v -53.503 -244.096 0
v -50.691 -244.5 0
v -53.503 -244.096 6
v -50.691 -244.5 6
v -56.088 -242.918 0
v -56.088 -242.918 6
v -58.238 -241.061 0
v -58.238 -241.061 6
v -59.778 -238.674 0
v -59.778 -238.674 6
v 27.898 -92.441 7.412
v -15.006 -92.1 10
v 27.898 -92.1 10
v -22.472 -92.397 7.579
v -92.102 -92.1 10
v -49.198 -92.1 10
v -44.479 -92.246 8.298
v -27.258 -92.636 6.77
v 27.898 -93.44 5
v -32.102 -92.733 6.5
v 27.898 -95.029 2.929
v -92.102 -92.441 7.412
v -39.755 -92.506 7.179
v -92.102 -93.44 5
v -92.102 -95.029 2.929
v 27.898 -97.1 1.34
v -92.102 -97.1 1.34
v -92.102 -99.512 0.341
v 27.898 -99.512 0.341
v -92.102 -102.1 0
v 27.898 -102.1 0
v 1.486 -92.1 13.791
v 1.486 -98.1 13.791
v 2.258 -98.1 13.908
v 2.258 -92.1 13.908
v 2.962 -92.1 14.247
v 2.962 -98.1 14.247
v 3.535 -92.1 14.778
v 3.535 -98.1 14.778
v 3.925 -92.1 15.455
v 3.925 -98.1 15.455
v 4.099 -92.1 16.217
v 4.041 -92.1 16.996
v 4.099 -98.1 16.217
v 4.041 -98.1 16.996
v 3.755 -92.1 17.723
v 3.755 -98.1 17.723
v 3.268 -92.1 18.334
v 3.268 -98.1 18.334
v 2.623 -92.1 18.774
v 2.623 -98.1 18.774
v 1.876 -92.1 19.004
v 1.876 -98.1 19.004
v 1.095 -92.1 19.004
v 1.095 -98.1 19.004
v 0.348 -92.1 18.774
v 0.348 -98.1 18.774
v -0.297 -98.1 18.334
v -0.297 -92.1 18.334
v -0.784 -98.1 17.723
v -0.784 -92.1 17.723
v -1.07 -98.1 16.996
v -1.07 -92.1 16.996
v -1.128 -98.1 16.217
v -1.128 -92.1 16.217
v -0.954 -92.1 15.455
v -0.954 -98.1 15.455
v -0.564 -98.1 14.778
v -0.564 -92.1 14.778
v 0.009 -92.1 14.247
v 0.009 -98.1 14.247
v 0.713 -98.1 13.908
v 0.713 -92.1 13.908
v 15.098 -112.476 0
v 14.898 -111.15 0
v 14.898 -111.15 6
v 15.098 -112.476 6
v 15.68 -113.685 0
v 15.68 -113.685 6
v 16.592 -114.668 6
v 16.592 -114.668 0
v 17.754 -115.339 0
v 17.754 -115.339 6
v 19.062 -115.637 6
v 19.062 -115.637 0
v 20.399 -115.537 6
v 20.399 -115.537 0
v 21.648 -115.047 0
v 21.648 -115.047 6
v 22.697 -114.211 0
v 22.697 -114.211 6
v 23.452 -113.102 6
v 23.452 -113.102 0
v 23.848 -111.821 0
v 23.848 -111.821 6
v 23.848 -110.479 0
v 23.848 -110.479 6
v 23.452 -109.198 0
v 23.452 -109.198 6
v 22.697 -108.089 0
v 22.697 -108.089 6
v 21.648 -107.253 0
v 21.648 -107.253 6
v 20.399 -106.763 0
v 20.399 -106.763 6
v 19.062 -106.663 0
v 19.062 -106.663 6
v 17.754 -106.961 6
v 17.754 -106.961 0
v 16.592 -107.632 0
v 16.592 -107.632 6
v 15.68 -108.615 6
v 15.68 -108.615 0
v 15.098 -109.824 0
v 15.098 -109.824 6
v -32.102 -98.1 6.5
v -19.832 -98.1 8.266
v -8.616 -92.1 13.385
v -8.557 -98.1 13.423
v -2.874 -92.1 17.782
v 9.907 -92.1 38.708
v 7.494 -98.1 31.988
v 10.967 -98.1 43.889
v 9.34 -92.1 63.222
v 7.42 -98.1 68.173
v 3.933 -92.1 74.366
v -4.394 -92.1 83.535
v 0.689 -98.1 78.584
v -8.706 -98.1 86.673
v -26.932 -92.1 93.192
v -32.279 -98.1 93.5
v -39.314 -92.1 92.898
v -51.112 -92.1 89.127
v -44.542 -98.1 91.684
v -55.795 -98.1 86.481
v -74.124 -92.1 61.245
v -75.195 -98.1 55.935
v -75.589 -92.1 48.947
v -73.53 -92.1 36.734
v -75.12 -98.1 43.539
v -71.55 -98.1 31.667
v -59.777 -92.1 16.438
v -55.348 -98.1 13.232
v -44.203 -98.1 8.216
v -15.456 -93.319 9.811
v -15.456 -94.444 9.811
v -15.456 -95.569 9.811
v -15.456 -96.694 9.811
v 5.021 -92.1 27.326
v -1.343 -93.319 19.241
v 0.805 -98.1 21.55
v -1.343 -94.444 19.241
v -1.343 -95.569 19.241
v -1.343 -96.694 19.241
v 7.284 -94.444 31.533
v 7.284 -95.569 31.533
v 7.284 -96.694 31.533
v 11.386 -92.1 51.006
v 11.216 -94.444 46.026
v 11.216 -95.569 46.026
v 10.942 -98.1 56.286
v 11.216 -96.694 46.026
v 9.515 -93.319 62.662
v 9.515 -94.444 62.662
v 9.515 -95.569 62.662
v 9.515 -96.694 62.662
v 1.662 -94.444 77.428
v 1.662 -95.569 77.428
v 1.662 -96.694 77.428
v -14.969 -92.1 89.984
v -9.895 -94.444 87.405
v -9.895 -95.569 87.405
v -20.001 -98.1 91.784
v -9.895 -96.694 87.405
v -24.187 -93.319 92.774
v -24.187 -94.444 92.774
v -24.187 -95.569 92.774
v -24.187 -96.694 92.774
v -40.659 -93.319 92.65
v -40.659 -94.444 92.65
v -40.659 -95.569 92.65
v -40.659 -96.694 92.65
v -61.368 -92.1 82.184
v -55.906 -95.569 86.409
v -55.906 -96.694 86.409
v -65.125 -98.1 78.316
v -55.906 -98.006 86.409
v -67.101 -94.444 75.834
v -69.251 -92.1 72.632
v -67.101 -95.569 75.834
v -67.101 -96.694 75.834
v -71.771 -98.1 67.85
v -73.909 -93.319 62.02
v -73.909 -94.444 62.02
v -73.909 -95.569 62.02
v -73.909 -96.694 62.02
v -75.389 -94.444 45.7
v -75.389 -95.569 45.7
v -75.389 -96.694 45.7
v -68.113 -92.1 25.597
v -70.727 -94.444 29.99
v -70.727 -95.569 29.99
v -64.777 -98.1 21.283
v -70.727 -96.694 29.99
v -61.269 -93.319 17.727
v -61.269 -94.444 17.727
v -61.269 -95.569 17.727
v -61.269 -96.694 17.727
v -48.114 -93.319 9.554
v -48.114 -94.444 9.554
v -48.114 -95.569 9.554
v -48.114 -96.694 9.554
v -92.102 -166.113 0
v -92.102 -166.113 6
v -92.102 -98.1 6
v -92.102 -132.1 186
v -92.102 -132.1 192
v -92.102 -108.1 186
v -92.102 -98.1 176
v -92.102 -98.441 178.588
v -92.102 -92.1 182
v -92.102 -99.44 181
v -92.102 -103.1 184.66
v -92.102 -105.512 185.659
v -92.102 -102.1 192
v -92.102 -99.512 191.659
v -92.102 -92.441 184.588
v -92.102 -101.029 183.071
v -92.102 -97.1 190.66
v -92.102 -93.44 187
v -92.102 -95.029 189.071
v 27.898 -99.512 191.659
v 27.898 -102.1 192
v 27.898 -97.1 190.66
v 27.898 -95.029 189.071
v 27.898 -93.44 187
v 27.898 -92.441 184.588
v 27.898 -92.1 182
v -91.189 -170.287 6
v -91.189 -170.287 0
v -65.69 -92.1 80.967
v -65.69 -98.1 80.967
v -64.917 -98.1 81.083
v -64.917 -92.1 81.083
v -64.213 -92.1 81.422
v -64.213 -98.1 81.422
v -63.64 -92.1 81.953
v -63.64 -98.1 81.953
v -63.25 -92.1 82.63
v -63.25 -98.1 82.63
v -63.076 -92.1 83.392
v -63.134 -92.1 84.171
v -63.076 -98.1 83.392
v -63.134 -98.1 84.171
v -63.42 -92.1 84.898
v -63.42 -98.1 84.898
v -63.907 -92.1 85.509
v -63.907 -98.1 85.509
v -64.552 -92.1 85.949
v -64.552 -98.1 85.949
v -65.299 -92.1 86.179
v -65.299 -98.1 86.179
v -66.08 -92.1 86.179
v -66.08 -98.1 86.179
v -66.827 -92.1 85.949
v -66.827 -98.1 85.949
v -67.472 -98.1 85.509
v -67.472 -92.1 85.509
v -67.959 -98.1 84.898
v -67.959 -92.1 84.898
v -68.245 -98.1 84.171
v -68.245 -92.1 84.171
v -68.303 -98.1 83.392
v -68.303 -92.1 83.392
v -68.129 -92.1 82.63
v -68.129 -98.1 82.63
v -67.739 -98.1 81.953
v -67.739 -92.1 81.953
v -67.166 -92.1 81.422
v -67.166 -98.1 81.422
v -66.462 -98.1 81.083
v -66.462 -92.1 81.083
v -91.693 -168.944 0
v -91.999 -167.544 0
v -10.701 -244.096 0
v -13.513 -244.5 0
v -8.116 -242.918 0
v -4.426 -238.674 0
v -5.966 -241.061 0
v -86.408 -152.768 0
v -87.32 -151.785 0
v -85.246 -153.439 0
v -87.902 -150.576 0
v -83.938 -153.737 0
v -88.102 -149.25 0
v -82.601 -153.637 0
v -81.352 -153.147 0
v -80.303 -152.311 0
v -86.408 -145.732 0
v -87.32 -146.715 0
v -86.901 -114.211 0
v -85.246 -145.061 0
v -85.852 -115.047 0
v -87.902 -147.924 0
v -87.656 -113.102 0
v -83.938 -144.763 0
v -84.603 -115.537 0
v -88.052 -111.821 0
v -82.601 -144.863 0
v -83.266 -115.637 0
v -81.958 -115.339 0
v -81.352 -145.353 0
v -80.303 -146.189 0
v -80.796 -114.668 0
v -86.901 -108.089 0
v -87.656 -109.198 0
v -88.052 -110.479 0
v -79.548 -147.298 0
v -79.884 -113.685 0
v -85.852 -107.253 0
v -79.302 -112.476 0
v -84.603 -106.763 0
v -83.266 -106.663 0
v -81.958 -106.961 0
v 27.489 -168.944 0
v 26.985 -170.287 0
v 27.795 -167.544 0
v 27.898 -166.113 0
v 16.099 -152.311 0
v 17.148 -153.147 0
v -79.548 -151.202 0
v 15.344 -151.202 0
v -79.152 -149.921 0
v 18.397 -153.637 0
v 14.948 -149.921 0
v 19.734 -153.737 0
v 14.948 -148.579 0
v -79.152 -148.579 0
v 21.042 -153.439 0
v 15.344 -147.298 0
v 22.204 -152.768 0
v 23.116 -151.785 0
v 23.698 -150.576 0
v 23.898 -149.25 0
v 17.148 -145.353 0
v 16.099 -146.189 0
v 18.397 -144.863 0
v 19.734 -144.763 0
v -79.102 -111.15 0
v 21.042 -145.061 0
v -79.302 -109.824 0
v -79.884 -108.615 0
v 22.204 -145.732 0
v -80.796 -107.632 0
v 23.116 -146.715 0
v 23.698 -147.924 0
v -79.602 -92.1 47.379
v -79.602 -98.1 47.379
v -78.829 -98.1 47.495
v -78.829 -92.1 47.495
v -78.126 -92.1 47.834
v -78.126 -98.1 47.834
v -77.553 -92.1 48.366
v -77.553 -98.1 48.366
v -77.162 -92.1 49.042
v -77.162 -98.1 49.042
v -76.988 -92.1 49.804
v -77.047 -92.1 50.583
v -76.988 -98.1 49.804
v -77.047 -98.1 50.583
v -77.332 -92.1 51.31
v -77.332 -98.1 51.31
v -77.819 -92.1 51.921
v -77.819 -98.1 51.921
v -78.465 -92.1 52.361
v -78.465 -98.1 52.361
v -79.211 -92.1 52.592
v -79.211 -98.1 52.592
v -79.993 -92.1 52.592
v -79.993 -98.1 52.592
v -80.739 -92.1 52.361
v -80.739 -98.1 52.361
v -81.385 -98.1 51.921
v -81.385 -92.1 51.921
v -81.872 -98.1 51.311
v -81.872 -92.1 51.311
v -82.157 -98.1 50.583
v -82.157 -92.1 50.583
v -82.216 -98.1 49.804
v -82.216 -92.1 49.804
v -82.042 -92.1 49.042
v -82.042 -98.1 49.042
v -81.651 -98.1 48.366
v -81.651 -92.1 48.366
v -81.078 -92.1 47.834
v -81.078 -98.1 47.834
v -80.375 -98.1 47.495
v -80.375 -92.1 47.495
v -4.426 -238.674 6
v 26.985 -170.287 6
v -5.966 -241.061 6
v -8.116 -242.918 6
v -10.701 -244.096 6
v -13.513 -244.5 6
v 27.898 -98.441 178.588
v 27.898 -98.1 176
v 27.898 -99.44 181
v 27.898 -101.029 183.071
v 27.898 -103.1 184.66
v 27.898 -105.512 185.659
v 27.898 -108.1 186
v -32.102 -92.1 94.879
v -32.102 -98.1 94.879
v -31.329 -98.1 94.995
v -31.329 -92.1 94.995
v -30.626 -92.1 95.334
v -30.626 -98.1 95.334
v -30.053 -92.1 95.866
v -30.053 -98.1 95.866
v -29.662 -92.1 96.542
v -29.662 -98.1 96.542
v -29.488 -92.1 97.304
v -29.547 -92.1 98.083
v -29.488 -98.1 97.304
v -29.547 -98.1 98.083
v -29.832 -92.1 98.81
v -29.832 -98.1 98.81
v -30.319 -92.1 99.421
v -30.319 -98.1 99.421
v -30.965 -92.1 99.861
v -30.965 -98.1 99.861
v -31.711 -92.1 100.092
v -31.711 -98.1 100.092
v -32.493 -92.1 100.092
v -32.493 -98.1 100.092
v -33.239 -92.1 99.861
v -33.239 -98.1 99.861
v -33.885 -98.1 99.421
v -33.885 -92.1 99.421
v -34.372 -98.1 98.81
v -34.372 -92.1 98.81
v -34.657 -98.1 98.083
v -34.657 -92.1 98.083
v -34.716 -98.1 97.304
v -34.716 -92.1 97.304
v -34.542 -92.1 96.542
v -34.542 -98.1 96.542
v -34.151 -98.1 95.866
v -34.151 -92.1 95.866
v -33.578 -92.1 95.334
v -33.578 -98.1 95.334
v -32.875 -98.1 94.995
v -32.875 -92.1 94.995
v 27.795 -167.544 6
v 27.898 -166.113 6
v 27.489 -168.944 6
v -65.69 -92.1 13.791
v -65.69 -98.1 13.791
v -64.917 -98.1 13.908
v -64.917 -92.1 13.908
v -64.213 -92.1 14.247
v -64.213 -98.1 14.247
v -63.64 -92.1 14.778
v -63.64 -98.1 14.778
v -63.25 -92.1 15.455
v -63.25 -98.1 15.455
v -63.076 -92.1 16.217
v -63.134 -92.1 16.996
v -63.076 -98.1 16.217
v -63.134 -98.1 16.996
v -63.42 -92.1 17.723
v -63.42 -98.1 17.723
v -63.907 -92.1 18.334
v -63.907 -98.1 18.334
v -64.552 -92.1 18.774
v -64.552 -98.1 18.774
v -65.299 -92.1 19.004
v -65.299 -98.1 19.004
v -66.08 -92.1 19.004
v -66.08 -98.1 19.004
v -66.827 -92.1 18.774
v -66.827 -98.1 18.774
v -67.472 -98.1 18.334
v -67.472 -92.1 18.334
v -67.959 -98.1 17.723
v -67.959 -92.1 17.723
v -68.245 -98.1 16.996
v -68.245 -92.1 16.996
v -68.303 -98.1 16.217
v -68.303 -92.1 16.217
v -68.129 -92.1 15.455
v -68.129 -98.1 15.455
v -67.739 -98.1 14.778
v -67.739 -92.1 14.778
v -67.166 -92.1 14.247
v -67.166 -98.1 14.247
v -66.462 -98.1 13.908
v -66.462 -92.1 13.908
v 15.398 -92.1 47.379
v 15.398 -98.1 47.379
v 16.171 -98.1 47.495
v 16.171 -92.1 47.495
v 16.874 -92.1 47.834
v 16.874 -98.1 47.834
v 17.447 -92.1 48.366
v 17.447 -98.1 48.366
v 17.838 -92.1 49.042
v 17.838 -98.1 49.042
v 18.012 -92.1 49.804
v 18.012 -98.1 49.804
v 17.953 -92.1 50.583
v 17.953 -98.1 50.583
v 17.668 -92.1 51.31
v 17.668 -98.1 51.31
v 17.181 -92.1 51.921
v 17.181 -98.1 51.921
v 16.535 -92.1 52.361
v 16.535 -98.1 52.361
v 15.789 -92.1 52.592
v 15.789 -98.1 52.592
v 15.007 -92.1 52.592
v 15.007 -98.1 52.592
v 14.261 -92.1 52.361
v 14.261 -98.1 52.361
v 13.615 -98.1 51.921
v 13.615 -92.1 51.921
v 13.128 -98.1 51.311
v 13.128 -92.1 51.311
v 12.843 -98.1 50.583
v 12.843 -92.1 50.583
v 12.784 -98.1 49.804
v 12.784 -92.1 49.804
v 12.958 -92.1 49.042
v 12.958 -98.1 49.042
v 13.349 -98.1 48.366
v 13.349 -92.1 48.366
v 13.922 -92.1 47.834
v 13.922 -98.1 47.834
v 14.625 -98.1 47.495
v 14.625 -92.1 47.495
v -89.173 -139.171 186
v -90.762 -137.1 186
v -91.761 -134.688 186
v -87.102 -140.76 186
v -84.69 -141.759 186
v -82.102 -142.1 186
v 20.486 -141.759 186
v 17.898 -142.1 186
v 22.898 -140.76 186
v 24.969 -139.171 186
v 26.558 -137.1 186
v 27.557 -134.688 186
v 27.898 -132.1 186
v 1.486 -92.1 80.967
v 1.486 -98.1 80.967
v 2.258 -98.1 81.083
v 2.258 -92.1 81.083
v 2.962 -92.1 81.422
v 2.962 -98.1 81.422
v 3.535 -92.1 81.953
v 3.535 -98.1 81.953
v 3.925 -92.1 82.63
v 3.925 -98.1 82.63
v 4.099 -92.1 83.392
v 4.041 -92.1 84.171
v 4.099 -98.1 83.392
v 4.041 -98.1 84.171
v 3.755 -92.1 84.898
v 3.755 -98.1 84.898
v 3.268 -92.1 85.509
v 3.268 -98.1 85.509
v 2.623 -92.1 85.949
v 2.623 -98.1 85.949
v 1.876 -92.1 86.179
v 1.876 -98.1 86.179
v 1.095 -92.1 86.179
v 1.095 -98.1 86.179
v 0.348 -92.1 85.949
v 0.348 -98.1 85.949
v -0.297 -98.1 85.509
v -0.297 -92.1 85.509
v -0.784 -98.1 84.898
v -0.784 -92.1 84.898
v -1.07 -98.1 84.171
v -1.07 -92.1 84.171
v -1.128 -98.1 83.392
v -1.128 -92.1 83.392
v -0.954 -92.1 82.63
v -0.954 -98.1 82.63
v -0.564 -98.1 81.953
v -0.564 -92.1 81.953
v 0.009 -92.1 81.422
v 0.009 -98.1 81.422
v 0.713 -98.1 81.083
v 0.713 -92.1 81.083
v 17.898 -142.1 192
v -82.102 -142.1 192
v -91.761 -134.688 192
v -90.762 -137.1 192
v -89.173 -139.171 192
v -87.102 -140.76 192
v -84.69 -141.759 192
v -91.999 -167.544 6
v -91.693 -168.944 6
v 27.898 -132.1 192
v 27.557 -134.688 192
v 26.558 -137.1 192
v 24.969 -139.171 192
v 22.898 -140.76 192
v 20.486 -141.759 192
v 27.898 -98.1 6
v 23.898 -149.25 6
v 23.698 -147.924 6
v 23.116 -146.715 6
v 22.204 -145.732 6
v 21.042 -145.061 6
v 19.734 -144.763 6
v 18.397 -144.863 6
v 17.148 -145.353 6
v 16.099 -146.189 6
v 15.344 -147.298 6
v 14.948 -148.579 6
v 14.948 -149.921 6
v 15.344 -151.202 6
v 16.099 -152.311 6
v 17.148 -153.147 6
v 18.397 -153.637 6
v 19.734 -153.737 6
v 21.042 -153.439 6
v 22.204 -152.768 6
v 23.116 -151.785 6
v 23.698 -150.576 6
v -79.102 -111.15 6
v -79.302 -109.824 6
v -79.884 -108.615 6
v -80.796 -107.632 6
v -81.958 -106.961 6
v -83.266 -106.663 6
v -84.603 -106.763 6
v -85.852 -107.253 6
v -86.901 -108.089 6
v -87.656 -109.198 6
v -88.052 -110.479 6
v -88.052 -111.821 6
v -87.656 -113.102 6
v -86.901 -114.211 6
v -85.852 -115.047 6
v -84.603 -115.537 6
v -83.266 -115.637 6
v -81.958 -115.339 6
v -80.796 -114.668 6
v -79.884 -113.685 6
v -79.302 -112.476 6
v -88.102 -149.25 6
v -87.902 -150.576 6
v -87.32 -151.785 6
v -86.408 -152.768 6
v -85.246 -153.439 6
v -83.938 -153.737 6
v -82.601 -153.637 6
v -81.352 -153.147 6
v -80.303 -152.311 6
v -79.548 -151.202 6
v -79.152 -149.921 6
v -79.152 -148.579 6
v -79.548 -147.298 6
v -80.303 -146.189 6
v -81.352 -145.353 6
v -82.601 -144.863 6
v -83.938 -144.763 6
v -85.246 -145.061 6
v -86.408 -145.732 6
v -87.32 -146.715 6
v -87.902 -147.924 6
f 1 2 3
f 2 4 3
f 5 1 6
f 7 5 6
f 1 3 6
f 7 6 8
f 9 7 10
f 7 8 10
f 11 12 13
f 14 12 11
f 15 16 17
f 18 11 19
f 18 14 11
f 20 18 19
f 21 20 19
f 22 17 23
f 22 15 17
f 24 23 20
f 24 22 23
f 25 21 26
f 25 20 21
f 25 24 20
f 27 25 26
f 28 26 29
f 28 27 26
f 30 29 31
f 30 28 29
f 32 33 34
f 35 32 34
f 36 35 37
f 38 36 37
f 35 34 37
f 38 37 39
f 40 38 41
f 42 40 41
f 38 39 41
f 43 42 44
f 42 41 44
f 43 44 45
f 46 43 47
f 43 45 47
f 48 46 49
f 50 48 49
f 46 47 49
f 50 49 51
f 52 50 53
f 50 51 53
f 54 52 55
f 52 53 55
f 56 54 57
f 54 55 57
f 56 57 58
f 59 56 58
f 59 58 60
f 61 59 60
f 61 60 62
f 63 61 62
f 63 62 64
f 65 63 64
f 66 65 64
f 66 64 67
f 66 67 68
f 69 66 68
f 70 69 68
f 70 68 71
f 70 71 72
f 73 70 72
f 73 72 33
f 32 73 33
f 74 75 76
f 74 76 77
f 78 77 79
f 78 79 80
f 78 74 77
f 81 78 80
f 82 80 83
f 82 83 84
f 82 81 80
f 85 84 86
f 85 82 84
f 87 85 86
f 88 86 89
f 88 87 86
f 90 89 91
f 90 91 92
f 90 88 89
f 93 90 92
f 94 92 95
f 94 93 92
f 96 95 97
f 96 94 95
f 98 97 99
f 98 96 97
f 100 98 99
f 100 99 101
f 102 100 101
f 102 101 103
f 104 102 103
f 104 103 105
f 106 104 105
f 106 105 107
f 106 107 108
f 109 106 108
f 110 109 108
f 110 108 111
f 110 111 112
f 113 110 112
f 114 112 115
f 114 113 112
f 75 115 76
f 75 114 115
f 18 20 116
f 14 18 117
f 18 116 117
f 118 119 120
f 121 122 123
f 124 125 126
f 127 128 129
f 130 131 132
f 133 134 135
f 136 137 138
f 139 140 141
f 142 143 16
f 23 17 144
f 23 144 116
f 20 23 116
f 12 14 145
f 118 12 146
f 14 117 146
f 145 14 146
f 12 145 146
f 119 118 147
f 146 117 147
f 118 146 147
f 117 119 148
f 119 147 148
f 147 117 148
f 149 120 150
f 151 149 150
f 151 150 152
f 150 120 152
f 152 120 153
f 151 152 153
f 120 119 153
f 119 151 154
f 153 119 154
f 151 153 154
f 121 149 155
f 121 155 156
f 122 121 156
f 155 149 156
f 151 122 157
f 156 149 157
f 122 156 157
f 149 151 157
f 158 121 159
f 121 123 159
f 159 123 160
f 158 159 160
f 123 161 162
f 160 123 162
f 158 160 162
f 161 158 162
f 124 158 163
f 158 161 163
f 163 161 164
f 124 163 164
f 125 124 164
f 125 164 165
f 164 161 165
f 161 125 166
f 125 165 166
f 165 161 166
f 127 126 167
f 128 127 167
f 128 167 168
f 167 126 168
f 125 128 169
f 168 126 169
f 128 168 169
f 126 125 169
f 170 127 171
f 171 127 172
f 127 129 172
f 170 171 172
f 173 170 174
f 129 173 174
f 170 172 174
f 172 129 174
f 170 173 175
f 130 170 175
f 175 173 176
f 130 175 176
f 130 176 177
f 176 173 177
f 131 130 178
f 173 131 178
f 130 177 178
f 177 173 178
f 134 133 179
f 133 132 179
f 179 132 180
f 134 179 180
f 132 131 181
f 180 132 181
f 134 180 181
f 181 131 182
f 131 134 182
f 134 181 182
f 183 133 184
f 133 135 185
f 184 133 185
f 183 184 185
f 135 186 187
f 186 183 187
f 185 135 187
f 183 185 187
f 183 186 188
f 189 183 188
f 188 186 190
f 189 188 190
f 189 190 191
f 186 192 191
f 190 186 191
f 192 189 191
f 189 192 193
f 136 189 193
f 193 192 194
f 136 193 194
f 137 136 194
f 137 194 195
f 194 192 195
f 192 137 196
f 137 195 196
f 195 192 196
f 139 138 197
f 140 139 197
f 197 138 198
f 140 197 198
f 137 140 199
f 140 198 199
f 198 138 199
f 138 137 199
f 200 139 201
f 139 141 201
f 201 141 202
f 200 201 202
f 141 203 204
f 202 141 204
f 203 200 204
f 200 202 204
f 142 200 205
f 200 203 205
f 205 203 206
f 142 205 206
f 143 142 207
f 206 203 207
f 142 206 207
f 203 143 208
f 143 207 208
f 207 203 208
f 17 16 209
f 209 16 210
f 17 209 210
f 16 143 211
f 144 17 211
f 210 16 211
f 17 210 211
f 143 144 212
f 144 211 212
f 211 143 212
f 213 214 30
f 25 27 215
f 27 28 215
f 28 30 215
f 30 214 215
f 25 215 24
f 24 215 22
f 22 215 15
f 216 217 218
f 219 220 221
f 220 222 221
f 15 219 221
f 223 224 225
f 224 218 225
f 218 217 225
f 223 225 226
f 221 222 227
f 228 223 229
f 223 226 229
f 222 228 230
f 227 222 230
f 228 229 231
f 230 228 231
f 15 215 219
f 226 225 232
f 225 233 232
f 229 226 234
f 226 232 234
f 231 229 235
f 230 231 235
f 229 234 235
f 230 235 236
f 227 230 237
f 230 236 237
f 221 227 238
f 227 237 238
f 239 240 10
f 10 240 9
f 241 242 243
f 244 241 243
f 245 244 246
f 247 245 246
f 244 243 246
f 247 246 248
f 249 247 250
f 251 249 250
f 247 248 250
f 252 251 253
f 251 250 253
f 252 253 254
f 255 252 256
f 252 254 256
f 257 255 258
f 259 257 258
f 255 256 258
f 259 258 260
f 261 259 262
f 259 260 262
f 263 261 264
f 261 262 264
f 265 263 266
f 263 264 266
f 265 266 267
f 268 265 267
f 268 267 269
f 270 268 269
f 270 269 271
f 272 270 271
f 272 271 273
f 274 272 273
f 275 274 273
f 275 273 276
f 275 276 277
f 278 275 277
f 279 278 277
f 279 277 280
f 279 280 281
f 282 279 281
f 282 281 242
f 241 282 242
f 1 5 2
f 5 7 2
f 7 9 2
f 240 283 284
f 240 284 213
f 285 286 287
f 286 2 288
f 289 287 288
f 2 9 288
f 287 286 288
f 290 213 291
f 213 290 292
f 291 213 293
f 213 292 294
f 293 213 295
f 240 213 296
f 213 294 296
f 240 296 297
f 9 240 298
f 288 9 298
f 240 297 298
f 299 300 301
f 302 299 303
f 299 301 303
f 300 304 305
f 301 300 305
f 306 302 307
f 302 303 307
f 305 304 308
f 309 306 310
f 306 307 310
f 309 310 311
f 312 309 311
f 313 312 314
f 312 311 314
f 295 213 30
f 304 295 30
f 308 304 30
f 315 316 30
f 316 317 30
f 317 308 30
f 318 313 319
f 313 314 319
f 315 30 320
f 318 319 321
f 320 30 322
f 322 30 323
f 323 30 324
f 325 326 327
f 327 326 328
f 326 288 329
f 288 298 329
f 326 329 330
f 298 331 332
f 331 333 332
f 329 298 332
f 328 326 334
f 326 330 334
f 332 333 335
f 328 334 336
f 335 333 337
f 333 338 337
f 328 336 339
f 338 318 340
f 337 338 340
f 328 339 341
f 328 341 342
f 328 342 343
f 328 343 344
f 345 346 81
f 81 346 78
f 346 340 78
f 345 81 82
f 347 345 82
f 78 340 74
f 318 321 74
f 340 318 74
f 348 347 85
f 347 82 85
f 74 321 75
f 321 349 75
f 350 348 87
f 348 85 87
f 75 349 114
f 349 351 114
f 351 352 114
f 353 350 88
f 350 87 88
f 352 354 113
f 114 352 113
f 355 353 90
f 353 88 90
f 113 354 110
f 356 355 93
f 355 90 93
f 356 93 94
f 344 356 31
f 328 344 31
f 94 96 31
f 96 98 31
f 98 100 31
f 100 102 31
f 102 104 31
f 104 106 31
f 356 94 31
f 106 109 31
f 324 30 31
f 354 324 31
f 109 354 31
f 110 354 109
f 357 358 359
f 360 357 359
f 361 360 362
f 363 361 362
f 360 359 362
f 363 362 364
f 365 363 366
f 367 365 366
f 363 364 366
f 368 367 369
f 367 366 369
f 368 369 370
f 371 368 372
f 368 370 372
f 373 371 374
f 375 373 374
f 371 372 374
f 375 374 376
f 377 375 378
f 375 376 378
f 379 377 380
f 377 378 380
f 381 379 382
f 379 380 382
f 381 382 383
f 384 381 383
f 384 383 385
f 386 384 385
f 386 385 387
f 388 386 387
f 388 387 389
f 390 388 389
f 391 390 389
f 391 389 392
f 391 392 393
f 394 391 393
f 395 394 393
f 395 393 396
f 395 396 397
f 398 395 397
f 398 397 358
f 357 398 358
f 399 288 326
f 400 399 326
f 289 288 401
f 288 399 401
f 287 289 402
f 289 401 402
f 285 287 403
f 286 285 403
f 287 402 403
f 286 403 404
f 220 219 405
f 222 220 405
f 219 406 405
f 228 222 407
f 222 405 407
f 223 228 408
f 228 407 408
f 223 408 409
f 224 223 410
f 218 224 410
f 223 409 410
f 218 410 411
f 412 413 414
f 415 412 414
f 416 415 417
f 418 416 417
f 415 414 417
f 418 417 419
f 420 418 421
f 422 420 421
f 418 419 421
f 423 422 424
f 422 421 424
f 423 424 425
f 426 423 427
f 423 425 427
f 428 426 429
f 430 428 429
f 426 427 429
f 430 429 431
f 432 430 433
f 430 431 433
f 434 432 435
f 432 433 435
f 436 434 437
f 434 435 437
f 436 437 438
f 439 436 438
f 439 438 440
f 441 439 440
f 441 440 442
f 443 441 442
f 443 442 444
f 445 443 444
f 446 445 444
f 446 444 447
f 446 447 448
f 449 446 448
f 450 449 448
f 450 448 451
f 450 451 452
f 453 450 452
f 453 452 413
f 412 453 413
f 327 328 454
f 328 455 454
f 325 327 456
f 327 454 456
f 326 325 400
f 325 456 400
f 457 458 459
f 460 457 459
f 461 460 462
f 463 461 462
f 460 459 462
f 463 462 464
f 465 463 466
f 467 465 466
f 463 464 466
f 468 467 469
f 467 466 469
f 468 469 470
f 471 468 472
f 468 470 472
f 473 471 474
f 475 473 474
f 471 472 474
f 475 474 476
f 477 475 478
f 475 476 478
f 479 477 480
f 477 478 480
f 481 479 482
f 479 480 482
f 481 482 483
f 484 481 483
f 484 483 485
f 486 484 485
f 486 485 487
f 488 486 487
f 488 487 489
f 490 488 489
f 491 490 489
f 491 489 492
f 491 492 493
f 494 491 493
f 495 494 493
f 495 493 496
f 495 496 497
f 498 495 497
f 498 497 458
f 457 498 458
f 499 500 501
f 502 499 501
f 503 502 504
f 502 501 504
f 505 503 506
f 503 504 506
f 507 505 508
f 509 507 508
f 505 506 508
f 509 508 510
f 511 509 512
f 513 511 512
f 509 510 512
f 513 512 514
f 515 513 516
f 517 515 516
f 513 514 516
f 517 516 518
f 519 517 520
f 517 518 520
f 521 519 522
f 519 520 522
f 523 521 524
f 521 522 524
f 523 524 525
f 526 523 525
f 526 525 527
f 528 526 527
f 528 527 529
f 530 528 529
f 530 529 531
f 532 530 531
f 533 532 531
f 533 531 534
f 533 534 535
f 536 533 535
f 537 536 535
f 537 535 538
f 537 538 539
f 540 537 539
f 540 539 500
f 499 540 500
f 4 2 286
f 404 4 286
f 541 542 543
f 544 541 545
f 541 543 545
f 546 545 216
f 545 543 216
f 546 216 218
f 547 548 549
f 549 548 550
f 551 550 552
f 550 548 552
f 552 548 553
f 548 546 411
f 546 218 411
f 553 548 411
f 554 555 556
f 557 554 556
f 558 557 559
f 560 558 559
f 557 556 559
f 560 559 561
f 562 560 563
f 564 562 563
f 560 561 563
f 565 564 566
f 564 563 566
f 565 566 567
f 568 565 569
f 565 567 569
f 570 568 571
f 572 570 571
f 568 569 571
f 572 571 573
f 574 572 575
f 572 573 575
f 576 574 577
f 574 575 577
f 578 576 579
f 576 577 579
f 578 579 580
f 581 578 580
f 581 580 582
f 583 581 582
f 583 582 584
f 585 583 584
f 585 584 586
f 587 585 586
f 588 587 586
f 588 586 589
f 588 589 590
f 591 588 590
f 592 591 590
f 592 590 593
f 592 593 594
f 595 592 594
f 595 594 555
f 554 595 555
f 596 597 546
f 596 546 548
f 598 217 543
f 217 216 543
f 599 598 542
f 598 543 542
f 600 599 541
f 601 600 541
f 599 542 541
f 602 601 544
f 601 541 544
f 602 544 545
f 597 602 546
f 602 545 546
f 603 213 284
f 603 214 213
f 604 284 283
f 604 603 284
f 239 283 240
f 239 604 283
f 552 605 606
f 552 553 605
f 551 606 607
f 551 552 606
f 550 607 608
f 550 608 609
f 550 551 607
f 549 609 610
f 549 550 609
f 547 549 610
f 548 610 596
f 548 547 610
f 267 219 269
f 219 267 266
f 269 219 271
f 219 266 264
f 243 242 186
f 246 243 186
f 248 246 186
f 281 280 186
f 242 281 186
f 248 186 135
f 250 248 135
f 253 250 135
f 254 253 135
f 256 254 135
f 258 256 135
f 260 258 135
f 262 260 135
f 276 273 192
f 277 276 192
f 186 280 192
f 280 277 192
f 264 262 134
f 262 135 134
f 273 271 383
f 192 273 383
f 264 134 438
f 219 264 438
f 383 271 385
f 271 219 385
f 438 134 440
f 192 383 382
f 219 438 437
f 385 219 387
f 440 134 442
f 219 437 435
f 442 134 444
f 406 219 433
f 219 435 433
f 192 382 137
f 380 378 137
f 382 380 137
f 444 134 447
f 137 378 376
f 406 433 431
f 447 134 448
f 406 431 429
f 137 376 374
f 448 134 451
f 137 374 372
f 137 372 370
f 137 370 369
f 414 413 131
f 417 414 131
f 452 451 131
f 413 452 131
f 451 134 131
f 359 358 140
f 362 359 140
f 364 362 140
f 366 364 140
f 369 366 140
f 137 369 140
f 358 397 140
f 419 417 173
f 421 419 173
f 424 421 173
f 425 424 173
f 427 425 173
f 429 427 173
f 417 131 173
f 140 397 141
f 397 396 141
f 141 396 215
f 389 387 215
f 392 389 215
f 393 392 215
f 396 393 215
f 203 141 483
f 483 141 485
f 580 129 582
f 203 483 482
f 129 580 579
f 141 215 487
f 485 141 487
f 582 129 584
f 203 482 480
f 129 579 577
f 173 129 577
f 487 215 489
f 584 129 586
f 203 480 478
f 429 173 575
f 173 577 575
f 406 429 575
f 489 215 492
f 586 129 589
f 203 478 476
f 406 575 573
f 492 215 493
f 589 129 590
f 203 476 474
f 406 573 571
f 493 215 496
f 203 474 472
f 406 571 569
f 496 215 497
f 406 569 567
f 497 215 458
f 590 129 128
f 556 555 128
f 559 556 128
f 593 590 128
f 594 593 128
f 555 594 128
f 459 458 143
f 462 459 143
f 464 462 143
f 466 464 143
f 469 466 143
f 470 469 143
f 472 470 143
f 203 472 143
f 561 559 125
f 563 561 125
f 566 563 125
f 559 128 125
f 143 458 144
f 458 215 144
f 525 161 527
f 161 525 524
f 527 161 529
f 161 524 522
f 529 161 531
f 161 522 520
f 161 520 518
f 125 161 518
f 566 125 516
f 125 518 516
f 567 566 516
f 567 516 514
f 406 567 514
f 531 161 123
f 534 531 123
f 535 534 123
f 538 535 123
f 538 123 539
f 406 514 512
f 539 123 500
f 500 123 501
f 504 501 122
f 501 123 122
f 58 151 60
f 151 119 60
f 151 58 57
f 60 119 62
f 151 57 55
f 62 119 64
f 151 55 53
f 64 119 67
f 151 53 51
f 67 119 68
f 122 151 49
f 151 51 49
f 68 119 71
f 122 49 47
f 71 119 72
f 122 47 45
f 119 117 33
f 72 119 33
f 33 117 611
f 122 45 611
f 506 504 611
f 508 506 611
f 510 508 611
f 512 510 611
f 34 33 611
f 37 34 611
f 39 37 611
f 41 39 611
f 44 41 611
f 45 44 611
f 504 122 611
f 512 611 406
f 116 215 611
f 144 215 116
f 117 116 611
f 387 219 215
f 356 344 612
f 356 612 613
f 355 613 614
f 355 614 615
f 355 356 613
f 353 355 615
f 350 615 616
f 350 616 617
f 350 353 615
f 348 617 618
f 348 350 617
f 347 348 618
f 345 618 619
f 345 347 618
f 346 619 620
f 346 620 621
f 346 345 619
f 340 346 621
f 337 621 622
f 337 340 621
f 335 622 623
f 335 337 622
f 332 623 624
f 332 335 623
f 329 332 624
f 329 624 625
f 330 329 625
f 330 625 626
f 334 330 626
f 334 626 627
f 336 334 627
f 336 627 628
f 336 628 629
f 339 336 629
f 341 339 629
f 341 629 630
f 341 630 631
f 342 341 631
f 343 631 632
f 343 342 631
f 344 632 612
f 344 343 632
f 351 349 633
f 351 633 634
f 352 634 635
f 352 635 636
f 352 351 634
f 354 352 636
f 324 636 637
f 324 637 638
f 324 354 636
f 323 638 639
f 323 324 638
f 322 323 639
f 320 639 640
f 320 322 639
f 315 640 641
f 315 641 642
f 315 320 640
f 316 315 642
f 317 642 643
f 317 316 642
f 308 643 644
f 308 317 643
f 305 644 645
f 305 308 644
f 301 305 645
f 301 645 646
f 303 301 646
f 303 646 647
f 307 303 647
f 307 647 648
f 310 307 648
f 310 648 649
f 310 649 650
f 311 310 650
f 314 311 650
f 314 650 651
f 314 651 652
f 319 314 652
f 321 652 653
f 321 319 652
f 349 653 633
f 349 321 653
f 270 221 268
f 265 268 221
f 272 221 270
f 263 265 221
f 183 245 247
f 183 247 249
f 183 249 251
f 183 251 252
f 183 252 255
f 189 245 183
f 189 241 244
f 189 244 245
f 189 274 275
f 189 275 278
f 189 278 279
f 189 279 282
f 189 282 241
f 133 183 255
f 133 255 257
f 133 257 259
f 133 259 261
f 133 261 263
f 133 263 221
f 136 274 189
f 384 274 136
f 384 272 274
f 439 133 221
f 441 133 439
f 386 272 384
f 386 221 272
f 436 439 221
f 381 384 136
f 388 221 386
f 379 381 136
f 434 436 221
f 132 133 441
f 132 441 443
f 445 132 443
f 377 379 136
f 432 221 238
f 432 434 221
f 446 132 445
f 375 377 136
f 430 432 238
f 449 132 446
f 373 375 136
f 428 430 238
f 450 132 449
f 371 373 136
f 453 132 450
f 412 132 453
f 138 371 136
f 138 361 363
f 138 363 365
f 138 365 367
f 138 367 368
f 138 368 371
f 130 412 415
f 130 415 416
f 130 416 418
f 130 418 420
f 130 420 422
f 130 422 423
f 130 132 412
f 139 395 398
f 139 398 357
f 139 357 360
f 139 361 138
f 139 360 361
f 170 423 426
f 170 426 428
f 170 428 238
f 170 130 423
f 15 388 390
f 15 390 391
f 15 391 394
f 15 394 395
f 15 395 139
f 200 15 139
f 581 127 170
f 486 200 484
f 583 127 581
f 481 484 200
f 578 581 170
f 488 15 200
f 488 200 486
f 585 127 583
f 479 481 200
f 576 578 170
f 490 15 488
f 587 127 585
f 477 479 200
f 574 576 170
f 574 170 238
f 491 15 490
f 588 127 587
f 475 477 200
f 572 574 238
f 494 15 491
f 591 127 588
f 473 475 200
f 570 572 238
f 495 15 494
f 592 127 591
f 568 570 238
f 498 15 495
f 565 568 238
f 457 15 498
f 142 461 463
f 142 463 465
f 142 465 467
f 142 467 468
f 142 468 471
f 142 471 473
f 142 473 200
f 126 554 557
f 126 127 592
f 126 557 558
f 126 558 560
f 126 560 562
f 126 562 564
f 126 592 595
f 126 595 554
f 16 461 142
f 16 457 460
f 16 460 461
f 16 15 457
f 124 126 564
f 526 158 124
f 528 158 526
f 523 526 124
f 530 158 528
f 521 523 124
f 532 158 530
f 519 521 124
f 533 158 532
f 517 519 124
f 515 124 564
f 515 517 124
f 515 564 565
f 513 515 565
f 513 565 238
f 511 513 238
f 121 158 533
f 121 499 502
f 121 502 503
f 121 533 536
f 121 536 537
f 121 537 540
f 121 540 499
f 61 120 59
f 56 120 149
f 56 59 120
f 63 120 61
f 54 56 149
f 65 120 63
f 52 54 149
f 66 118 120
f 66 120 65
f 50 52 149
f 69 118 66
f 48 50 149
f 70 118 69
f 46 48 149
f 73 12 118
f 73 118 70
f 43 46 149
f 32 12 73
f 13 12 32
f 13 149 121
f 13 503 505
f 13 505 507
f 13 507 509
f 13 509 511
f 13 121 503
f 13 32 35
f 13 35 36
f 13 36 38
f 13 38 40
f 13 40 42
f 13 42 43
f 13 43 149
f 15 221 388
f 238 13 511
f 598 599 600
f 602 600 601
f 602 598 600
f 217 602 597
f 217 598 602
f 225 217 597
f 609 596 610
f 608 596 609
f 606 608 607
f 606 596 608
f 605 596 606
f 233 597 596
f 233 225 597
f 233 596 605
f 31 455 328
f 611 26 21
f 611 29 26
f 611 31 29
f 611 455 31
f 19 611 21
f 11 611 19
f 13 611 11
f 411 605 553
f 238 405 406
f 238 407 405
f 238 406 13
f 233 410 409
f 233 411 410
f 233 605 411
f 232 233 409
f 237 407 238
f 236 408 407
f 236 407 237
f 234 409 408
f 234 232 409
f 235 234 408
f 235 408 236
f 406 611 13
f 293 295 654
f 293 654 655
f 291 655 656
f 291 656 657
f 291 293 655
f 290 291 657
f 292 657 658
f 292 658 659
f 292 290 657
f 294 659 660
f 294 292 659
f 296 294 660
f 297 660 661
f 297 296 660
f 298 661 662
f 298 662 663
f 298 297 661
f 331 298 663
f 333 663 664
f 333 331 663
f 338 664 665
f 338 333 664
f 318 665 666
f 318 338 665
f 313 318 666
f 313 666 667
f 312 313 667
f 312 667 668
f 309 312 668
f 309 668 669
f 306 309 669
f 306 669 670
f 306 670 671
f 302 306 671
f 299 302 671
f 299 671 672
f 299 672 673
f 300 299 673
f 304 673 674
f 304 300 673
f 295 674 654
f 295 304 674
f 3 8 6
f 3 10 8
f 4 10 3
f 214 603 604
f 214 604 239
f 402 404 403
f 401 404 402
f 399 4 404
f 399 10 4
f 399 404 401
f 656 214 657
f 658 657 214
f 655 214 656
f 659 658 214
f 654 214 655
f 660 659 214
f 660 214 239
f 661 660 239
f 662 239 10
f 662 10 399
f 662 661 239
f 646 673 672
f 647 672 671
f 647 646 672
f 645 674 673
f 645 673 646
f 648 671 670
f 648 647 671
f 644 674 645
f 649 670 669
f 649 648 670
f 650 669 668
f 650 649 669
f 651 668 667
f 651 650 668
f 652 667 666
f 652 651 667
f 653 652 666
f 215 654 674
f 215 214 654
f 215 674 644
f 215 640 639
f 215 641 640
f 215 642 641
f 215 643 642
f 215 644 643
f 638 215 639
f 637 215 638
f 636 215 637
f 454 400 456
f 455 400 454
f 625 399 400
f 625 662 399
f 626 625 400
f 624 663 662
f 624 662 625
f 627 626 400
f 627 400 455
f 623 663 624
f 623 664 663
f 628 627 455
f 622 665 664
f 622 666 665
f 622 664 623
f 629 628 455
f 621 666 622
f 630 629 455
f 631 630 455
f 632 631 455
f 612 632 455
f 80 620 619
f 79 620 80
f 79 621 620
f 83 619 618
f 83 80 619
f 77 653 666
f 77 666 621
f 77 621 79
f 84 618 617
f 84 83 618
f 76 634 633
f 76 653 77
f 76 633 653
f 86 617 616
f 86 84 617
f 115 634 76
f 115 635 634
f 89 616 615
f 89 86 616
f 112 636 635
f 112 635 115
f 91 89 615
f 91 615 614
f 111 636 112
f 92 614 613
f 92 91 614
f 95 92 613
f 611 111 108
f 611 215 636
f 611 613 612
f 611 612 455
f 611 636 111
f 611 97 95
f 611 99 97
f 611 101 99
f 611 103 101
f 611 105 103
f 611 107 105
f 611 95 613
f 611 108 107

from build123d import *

# Parameters (mm, degrees)
CROQUIS1_R              = 4.5
SALIENTE_EXTRUIR1_DEPTH = 6
CROQUIS2_W              = 120
CROQUIS2_H              = 6
SALIENTE_EXTRUIR2_DEPTH = 186
CROQUIS3_W              = 120
CROQUIS3_H              = 44
SALIENTE_EXTRUIR3_DEPTH = 6
REDONDEO1_R             = 10
CROQUIS4_R              = 2.621
CORTAR_EXTRUIR1_DEPTH   = 259.417772547


with BuildPart() as part:
    # Croquis1 → Saliente-Extruir1 (new body)
    with BuildSketch(Plane.XY):
        Polygon((-92.102036721, -168.3), (-57.102036721, -244.5), (-7.102036721, -244.5), (27.897963279, -168.3), (27.897963279, -92.1), (-92.102036721, -92.1), align=None)
        with Locations((-83.602036721, -111.15)):
            Circle(CROQUIS1_R, mode=Mode.SUBTRACT)
        with Locations(Location((-83.602036721, -149.25, 0), (0, 0, 180))):
            Circle(CROQUIS1_R, mode=Mode.SUBTRACT)
        with Locations((19.397963279, -149.25)):
            Circle(CROQUIS1_R, mode=Mode.SUBTRACT)
        with Locations(Location((19.397963279, -111.15, 0), (0, 0, 180))):
            Circle(CROQUIS1_R, mode=Mode.SUBTRACT)
    extrude(amount=SALIENTE_EXTRUIR1_DEPTH)

    # Croquis2 → Saliente-Extruir2 (add)
    with BuildSketch(Plane.XY.offset(6)):
        with Locations((-32.102036721, -95.1)):
            Rectangle(CROQUIS2_W, CROQUIS2_H)
    extrude(amount=SALIENTE_EXTRUIR2_DEPTH)

    # Croquis3 → Saliente-Extruir3 (add)
    with BuildSketch(Plane.XY.offset(192)):
        with Locations((-32.102036721, -120.1)):
            Rectangle(CROQUIS3_W, CROQUIS3_H)
    extrude(amount=-SALIENTE_EXTRUIR3_DEPTH)

    # Redondeo1
    redondeo1_edges = [part.edges().sort_by_distance(p)[0] for p in [
        (27.897963279, -168.3, 3),
        (-7.102036721, -244.5, 3),
        (-57.102036721, -244.5, 3),
        (-92.102036721, -168.3, 3),
        (-32.102036721, -92.1, 192),
        (-92.102036721, -142.1, 189),
        (-32.102036721, -98.1, 186),
        (27.897963279, -142.1, 189),
        (-32.102036721, -92.1, 0),
    ]]
    fillet(redondeo1_edges, radius=REDONDEO1_R)

    # Croquis4 → Cortar-Extruir1 (cut, through all)
    with BuildSketch(Plane.XZ.offset(98.1)):
        with Locations(Location((1.485535385, 83.587572106, 0), (0, 0, 270))):
            Circle(CROQUIS4_R)
        with Locations(Location((-65.689608828, 16.412427894, 0), (0, 0, 270))):
            Circle(CROQUIS4_R)
        with Locations(Location((15.397963279, 50, 0), (0, 0, 270))):
            Circle(CROQUIS4_R)
        with Locations(Location((1.485535385, 16.412427894, 0), (0, 0, 270))):
            Circle(CROQUIS4_R)
        with Locations(Location((-65.689608828, 83.587572106, 0), (0, 0, 270))):
            Circle(CROQUIS4_R)
        with Locations(Location((-32.102036721, 97.5, 0), (0, 0, 270))):
            Circle(CROQUIS4_R)
        with Locations(Location((-79.602036721, 50, 0), (0, 0, 270))):
            Circle(CROQUIS4_R)
        with BuildLine():
            add(Edge.make_bspline(
                [(-32.102036721, 6.5), (-30.775341976, 6.499993534), (-28.122039283, 6.620682339), (-24.096613371, 7.177840976), (-20.062551193, 8.127248902), (-16.009319538, 9.510205402), (-12.057431762, 11.308759473), (-8.231122582, 13.545008905), (-4.625202085, 16.175326085), (-1.288566333, 19.186782917), (1.722751008, 22.523306389), (4.353148795, 26.129382286), (6.589284057, 29.95555323), (8.387887512, 33.907608072), (9.770762576, 37.960684071), (10.720181934, 41.994878278), (11.277273839, 46.020137925), (11.45831212, 50.000176972), (11.277257351, 53.980039938), (10.720117639, 58.005467444), (9.770712855, 62.03948534), (8.387758304, 66.092717236), (6.589203689, 70.044604944), (4.352954406, 73.870914143), (1.722637185, 77.476834635), (-1.288819636, 80.813470389), (-4.62534311, 83.824787729), (-8.231419007, 86.455185516), (-12.057589951, 88.691320778), (-16.009644794, 90.489924234), (-20.062720792, 91.872799297), (-24.096914999, 92.822218655), (-28.122174647, 93.37931056), (-32.102213693, 93.560348842), (-36.082076659, 93.379294072), (-40.107504165, 92.82215436), (-44.141522061, 91.872749576), (-48.194753957, 90.489795025), (-52.146641666, 88.691240411), (-55.972950865, 86.454991127), (-59.578871356, 83.824673906), (-62.91550711, 80.813217085), (-65.92682445, 77.476693611), (-68.557222237, 73.870617714), (-70.7933575, 70.04444677), (-72.591960955, 66.092391928), (-73.974836018, 62.039315929), (-74.924255376, 58.005121722), (-75.481347281, 53.979862075), (-75.662385563, 49.999823028), (-75.481330794, 46.019960062), (-74.924191081, 41.994532556), (-73.974786297, 37.96051466), (-72.591831746, 33.907282764), (-70.793277132, 29.955395056), (-68.557027848, 26.129085856), (-65.926710628, 22.523165366), (-62.915253807, 19.186529609), (-59.578730331, 16.17521228), (-55.972654439, 13.544814452), (-52.146483477, 11.308679338), (-48.194428701, 9.51007534), (-44.141352462, 8.127202224), (-40.107202532, 7.177786011), (-36.081941291, 6.620713021), (-33.428642641, 6.500006466), (-32.102036721, 6.5)],
                knots=[0, 0, 0, 0, 0.014562552, 0.029124133, 0.044561437, 0.059996822, 0.076077508, 0.092156266, 0.108579119, 0.125000004, 0.141422857, 0.157843742, 0.173924427, 0.190003186, 0.20544049, 0.220875875, 0.235438912, 0.250000004, 0.264563041, 0.279124133, 0.294561437, 0.309996822, 0.326077508, 0.342156266, 0.358579119, 0.375000004, 0.391422857, 0.407843742, 0.423924427, 0.440003186, 0.45544049, 0.470875875, 0.485438912, 0.500000004, 0.514563041, 0.529124133, 0.544561437, 0.559996822, 0.576077508, 0.592156266, 0.608579119, 0.625000004, 0.641422857, 0.657843742, 0.673924427, 0.690003186, 0.70544049, 0.720875875, 0.735438912, 0.750000004, 0.764563041, 0.779124133, 0.794561437, 0.809996822, 0.826077508, 0.842156266, 0.858579119, 0.875000004, 0.891422857, 0.907843742, 0.923924427, 0.940003186, 0.95544049, 0.970875875, 0.985438423, 1, 1, 1, 1], degree=3))
        make_face()
    extrude(amount=-CORTAR_EXTRUIR1_DEPTH, mode=Mode.SUBTRACT)


solid = part.part
